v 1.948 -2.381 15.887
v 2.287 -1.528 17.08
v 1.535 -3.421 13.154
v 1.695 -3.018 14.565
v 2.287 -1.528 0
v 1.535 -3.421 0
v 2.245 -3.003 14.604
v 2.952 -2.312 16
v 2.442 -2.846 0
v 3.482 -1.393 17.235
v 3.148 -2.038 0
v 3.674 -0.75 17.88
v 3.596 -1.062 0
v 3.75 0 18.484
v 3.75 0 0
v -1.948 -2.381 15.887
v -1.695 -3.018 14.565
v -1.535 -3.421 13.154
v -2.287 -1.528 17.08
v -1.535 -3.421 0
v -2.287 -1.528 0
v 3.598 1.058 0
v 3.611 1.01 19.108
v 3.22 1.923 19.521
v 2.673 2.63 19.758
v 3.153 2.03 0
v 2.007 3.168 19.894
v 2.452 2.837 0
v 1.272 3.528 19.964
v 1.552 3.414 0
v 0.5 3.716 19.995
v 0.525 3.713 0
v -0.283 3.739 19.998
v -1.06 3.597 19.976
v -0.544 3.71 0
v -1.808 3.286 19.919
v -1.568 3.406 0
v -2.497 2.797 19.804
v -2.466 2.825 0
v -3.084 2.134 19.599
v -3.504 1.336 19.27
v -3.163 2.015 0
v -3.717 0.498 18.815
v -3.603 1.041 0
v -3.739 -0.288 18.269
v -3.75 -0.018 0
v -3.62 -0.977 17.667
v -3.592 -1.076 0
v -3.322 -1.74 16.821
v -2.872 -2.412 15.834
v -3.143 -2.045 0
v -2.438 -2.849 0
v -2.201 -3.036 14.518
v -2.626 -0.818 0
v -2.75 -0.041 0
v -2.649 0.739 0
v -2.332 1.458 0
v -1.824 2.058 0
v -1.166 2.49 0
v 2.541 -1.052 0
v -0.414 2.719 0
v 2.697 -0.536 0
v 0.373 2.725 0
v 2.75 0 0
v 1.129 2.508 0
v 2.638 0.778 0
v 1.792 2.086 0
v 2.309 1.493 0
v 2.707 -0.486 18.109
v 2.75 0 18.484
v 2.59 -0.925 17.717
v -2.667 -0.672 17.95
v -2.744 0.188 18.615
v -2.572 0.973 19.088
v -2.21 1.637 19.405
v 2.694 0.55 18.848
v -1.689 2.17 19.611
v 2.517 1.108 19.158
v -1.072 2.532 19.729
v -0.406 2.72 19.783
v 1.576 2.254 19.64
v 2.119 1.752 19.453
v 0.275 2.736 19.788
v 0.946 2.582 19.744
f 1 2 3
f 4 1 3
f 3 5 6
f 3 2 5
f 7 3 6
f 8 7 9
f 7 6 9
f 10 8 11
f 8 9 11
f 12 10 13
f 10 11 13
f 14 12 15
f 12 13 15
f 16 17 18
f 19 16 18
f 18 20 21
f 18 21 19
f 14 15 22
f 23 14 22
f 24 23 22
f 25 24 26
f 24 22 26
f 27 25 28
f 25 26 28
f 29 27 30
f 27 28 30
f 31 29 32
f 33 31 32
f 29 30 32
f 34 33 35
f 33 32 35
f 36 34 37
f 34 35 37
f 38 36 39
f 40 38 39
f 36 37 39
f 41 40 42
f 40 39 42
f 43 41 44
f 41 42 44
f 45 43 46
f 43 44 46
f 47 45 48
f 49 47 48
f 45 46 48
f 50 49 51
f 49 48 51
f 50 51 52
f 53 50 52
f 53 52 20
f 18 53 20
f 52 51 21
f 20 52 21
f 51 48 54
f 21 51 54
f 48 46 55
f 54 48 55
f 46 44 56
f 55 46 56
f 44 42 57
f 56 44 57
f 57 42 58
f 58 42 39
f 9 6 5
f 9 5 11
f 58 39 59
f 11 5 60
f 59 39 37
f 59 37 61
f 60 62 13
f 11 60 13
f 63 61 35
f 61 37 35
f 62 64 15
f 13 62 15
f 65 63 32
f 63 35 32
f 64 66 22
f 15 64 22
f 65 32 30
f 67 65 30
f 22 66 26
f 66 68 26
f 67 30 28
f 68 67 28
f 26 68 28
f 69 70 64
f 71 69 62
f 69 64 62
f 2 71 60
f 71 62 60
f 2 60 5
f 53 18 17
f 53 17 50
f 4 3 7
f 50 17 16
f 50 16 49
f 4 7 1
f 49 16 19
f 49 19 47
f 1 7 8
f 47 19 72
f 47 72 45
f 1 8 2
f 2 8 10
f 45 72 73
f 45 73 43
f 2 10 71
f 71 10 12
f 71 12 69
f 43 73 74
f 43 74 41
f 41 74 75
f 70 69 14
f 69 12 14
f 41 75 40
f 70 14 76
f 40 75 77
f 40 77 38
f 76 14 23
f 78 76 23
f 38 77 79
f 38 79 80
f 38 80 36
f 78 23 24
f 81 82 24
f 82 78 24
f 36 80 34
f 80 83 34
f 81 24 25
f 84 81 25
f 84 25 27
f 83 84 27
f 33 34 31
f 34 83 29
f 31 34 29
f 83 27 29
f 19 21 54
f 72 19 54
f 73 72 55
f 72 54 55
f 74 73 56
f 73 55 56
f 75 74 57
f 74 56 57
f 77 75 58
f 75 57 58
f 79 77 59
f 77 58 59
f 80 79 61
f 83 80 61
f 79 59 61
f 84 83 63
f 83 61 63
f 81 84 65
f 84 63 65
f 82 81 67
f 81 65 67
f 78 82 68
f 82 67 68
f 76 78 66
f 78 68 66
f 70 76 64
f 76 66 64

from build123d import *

# Parameters (mm, degrees)
F1_DEPTH = 20
F3_DEPTH = 12.7


with BuildPart() as f1:
    # F0 (on Top) → F1 (new body)
    with BuildSketch(Plane.XY):
        with BuildLine():
            ThreePointArc((-2.28661, -1.527716), (-0.798224, 2.631604), (2.75, 0))
            ThreePointArc((2.75, 0), (2.631604, -0.798224), (2.28661, -1.527716))
            Line((2.28661, -1.527716), (1.535176, -3.421364))
            ThreePointArc((1.535176, -3.421364), (3.147968, -2.037841), (3.75, 0))
            ThreePointArc((3.75, 0), (-2.037841, 3.147968), (-1.535176, -3.421364))
            Line((-1.535176, -3.421364), (-2.28661, -1.527716))
        make_face()
    extrude(amount=F1_DEPTH)

    # F2 (on Right) → F3 (cut, symmetric)
    with BuildSketch(Plane.YZ):
        with BuildLine():
            Line((-3.45, 20), (-3.45, 13))
            ThreePointArc((-3.45, 13), (-0.981115, 17.663433), (3.75, 20))
            Line((3.75, 20), (-3.45, 20))
        make_face()
    extrude(amount=F3_DEPTH, both=True, mode=Mode.SUBTRACT)


solid = f1.part
